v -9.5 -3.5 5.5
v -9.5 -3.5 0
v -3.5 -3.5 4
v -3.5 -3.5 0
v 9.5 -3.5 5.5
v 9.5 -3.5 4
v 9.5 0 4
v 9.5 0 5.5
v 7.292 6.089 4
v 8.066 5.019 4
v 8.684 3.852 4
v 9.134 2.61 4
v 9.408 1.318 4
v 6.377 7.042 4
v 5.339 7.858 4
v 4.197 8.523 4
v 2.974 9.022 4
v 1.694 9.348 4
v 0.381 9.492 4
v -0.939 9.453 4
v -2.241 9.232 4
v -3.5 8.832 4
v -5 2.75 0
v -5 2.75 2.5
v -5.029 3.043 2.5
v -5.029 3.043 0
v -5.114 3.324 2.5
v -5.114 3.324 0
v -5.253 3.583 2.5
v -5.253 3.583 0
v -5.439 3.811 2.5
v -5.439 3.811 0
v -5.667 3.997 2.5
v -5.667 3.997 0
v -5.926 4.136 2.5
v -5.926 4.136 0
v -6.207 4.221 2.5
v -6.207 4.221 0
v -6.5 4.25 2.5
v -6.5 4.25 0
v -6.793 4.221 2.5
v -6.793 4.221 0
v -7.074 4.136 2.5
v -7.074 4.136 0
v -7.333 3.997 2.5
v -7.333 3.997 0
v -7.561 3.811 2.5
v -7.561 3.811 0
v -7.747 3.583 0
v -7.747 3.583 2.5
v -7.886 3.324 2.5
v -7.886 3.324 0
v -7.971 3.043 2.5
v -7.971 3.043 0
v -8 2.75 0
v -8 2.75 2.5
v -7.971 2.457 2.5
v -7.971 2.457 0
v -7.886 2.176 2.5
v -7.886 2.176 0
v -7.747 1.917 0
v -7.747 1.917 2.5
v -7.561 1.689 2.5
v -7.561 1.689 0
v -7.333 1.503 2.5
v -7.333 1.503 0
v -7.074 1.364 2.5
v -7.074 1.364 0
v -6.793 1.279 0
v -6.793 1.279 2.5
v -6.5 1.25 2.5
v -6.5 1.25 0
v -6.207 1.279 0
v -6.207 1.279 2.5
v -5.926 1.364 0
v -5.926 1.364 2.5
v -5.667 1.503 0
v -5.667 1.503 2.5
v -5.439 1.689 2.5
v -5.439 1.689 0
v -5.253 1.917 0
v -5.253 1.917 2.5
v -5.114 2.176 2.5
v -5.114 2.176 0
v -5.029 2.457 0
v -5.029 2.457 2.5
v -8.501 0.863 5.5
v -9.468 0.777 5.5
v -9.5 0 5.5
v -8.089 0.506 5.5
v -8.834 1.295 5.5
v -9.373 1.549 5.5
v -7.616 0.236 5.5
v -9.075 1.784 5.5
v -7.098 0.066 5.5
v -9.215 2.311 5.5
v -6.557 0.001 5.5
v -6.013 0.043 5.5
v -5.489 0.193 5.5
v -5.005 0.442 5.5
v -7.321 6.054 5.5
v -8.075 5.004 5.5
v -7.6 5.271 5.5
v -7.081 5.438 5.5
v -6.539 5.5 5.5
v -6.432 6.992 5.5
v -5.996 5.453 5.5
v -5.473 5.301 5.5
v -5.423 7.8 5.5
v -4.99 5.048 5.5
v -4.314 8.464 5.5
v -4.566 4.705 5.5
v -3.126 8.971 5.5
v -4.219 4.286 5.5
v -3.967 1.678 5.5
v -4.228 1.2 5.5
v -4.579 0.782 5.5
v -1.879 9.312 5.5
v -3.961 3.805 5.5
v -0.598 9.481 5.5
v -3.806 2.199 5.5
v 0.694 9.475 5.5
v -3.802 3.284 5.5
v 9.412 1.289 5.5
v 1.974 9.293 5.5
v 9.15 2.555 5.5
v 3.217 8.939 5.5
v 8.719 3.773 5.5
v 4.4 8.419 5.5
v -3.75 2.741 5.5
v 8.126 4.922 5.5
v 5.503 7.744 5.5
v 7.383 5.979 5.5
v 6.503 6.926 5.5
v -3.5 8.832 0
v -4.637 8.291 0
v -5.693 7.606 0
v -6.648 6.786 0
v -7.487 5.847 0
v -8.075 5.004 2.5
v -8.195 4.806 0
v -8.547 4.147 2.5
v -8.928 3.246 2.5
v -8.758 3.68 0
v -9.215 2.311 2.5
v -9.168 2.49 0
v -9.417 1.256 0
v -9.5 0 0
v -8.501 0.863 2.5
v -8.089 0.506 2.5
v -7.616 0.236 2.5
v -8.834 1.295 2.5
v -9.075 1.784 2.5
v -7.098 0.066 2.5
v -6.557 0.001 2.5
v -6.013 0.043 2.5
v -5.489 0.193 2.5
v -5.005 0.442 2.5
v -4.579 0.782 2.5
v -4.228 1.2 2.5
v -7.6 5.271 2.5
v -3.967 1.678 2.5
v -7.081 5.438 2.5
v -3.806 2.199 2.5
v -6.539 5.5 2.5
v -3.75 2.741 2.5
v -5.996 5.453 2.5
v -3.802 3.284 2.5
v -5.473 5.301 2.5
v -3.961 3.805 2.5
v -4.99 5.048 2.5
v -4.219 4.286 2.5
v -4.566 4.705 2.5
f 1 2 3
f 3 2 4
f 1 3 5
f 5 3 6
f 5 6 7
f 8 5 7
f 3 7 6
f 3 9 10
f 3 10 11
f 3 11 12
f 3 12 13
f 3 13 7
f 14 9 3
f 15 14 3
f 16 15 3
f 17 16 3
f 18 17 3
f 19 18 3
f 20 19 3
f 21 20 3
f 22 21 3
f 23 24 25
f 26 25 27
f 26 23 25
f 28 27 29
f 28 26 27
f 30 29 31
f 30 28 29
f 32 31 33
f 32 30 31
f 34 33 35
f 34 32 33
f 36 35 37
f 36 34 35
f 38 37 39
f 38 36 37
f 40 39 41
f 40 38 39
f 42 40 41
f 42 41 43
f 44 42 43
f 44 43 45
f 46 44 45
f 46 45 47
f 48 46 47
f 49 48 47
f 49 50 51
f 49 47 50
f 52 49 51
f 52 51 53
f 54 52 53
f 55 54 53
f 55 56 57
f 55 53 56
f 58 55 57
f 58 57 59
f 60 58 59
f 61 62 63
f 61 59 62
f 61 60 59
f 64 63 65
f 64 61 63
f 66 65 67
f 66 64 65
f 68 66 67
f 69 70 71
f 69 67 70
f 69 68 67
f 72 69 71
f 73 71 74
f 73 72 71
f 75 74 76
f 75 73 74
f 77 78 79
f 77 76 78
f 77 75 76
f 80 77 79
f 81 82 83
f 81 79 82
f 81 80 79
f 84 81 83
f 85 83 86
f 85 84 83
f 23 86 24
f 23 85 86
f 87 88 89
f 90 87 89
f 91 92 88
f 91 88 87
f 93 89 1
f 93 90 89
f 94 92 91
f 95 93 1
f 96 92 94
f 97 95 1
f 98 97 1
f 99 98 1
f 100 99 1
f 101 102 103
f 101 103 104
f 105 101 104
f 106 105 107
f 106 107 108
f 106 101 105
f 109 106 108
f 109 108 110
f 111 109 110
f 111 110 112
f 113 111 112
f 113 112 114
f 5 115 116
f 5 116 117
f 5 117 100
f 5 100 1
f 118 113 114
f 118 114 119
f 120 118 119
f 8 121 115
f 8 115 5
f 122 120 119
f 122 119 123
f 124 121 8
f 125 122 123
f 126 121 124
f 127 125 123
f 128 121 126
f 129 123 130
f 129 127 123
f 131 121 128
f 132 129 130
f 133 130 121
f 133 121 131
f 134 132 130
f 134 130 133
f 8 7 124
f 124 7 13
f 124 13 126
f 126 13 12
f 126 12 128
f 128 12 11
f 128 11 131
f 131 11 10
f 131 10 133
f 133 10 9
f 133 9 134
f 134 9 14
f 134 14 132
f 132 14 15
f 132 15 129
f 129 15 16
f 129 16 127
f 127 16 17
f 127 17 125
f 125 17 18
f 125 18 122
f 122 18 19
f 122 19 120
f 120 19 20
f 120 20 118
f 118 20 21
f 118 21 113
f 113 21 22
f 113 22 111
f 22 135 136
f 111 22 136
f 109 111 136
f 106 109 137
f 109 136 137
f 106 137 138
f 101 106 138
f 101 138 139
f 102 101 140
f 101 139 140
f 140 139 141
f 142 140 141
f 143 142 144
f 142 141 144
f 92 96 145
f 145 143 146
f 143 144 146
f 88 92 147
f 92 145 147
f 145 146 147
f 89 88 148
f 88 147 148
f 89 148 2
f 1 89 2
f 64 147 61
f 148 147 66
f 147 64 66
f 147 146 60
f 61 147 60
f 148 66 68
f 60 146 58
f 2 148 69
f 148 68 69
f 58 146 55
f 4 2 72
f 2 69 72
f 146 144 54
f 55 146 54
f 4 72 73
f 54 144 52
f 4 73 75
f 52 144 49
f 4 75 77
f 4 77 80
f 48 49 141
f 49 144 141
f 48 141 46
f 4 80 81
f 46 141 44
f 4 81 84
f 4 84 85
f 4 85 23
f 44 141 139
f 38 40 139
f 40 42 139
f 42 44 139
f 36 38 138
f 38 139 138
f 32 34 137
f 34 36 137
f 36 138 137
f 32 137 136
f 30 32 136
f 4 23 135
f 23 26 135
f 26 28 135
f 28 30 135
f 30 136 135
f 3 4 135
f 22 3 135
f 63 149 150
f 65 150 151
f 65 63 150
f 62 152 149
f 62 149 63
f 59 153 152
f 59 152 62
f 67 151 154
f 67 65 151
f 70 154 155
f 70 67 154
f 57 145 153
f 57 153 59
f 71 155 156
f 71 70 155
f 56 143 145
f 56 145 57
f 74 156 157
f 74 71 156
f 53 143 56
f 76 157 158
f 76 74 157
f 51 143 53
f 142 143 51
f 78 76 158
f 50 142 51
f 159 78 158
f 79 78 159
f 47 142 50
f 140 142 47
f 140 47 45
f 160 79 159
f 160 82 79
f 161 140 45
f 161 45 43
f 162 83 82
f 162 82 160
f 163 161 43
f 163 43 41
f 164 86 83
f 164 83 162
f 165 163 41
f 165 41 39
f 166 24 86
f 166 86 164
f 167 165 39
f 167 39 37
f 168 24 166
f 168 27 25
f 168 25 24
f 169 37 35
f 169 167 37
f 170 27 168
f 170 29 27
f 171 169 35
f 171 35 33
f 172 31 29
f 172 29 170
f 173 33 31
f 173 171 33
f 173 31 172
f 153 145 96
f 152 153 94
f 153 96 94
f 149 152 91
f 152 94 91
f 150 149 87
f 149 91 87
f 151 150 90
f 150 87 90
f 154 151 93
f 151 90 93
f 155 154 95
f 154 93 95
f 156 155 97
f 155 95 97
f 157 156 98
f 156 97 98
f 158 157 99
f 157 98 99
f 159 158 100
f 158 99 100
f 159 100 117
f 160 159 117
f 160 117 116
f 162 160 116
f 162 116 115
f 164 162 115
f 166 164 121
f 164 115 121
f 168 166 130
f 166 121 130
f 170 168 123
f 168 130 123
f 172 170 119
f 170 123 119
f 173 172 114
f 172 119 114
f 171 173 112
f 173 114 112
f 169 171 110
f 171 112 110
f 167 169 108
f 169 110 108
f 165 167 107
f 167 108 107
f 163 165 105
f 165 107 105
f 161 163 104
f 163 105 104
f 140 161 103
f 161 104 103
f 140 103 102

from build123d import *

# Parameters (mm, degrees)
ESBO_O1_R                = 1.5
RESSALTO_EXTRUS_O1_DEPTH = 5.5
ESBO_O2_W                = 13
ESBO_O2_H                = 14.546827215
CORTE_EXTRUS_O1_DEPTH    = 4
ESBO_O3_R                = 2.75
CORTE_EXTRUS_O2_DEPTH    = 3


with BuildPart() as part:
    # Esboço1 → Ressalto-extrusão1 (new body)
    with BuildSketch(Plane.XY):
        with BuildLine():
            Line((-9.5, 0), (-9.5, -3.5))
            Line((-9.5, -3.5), (9.5, -3.5))
            Line((9.5, -3.5), (9.5, 0))
            ThreePointArc((9.5, 0), (0, 9.5), (-9.5, 0))
        make_face()
        with Locations((-6.5, 2.75)):
            Circle(ESBO_O1_R, mode=Mode.SUBTRACT)
    extrude(amount=RESSALTO_EXTRUS_O1_DEPTH)

    # Esboço2 → Corte-extrusão1 (cut)
    with BuildSketch(Plane(origin=(0, 0, 0), x_dir=(-1, 0, 0), z_dir=(0, 0, -1))):
        with Locations((-3, 3.773413608)):
            Rectangle(ESBO_O2_W, ESBO_O2_H)
    extrude(amount=-CORTE_EXTRUS_O1_DEPTH, mode=Mode.SUBTRACT)

    # Esboço3 → Corte-extrusão2 (cut)
    with BuildSketch(Plane.XY.offset(5.5)):
        with Locations((-6.5, 2.75)):
            Circle(ESBO_O3_R)
    extrude(amount=-CORTE_EXTRUS_O2_DEPTH, mode=Mode.SUBTRACT)


solid = part.part
